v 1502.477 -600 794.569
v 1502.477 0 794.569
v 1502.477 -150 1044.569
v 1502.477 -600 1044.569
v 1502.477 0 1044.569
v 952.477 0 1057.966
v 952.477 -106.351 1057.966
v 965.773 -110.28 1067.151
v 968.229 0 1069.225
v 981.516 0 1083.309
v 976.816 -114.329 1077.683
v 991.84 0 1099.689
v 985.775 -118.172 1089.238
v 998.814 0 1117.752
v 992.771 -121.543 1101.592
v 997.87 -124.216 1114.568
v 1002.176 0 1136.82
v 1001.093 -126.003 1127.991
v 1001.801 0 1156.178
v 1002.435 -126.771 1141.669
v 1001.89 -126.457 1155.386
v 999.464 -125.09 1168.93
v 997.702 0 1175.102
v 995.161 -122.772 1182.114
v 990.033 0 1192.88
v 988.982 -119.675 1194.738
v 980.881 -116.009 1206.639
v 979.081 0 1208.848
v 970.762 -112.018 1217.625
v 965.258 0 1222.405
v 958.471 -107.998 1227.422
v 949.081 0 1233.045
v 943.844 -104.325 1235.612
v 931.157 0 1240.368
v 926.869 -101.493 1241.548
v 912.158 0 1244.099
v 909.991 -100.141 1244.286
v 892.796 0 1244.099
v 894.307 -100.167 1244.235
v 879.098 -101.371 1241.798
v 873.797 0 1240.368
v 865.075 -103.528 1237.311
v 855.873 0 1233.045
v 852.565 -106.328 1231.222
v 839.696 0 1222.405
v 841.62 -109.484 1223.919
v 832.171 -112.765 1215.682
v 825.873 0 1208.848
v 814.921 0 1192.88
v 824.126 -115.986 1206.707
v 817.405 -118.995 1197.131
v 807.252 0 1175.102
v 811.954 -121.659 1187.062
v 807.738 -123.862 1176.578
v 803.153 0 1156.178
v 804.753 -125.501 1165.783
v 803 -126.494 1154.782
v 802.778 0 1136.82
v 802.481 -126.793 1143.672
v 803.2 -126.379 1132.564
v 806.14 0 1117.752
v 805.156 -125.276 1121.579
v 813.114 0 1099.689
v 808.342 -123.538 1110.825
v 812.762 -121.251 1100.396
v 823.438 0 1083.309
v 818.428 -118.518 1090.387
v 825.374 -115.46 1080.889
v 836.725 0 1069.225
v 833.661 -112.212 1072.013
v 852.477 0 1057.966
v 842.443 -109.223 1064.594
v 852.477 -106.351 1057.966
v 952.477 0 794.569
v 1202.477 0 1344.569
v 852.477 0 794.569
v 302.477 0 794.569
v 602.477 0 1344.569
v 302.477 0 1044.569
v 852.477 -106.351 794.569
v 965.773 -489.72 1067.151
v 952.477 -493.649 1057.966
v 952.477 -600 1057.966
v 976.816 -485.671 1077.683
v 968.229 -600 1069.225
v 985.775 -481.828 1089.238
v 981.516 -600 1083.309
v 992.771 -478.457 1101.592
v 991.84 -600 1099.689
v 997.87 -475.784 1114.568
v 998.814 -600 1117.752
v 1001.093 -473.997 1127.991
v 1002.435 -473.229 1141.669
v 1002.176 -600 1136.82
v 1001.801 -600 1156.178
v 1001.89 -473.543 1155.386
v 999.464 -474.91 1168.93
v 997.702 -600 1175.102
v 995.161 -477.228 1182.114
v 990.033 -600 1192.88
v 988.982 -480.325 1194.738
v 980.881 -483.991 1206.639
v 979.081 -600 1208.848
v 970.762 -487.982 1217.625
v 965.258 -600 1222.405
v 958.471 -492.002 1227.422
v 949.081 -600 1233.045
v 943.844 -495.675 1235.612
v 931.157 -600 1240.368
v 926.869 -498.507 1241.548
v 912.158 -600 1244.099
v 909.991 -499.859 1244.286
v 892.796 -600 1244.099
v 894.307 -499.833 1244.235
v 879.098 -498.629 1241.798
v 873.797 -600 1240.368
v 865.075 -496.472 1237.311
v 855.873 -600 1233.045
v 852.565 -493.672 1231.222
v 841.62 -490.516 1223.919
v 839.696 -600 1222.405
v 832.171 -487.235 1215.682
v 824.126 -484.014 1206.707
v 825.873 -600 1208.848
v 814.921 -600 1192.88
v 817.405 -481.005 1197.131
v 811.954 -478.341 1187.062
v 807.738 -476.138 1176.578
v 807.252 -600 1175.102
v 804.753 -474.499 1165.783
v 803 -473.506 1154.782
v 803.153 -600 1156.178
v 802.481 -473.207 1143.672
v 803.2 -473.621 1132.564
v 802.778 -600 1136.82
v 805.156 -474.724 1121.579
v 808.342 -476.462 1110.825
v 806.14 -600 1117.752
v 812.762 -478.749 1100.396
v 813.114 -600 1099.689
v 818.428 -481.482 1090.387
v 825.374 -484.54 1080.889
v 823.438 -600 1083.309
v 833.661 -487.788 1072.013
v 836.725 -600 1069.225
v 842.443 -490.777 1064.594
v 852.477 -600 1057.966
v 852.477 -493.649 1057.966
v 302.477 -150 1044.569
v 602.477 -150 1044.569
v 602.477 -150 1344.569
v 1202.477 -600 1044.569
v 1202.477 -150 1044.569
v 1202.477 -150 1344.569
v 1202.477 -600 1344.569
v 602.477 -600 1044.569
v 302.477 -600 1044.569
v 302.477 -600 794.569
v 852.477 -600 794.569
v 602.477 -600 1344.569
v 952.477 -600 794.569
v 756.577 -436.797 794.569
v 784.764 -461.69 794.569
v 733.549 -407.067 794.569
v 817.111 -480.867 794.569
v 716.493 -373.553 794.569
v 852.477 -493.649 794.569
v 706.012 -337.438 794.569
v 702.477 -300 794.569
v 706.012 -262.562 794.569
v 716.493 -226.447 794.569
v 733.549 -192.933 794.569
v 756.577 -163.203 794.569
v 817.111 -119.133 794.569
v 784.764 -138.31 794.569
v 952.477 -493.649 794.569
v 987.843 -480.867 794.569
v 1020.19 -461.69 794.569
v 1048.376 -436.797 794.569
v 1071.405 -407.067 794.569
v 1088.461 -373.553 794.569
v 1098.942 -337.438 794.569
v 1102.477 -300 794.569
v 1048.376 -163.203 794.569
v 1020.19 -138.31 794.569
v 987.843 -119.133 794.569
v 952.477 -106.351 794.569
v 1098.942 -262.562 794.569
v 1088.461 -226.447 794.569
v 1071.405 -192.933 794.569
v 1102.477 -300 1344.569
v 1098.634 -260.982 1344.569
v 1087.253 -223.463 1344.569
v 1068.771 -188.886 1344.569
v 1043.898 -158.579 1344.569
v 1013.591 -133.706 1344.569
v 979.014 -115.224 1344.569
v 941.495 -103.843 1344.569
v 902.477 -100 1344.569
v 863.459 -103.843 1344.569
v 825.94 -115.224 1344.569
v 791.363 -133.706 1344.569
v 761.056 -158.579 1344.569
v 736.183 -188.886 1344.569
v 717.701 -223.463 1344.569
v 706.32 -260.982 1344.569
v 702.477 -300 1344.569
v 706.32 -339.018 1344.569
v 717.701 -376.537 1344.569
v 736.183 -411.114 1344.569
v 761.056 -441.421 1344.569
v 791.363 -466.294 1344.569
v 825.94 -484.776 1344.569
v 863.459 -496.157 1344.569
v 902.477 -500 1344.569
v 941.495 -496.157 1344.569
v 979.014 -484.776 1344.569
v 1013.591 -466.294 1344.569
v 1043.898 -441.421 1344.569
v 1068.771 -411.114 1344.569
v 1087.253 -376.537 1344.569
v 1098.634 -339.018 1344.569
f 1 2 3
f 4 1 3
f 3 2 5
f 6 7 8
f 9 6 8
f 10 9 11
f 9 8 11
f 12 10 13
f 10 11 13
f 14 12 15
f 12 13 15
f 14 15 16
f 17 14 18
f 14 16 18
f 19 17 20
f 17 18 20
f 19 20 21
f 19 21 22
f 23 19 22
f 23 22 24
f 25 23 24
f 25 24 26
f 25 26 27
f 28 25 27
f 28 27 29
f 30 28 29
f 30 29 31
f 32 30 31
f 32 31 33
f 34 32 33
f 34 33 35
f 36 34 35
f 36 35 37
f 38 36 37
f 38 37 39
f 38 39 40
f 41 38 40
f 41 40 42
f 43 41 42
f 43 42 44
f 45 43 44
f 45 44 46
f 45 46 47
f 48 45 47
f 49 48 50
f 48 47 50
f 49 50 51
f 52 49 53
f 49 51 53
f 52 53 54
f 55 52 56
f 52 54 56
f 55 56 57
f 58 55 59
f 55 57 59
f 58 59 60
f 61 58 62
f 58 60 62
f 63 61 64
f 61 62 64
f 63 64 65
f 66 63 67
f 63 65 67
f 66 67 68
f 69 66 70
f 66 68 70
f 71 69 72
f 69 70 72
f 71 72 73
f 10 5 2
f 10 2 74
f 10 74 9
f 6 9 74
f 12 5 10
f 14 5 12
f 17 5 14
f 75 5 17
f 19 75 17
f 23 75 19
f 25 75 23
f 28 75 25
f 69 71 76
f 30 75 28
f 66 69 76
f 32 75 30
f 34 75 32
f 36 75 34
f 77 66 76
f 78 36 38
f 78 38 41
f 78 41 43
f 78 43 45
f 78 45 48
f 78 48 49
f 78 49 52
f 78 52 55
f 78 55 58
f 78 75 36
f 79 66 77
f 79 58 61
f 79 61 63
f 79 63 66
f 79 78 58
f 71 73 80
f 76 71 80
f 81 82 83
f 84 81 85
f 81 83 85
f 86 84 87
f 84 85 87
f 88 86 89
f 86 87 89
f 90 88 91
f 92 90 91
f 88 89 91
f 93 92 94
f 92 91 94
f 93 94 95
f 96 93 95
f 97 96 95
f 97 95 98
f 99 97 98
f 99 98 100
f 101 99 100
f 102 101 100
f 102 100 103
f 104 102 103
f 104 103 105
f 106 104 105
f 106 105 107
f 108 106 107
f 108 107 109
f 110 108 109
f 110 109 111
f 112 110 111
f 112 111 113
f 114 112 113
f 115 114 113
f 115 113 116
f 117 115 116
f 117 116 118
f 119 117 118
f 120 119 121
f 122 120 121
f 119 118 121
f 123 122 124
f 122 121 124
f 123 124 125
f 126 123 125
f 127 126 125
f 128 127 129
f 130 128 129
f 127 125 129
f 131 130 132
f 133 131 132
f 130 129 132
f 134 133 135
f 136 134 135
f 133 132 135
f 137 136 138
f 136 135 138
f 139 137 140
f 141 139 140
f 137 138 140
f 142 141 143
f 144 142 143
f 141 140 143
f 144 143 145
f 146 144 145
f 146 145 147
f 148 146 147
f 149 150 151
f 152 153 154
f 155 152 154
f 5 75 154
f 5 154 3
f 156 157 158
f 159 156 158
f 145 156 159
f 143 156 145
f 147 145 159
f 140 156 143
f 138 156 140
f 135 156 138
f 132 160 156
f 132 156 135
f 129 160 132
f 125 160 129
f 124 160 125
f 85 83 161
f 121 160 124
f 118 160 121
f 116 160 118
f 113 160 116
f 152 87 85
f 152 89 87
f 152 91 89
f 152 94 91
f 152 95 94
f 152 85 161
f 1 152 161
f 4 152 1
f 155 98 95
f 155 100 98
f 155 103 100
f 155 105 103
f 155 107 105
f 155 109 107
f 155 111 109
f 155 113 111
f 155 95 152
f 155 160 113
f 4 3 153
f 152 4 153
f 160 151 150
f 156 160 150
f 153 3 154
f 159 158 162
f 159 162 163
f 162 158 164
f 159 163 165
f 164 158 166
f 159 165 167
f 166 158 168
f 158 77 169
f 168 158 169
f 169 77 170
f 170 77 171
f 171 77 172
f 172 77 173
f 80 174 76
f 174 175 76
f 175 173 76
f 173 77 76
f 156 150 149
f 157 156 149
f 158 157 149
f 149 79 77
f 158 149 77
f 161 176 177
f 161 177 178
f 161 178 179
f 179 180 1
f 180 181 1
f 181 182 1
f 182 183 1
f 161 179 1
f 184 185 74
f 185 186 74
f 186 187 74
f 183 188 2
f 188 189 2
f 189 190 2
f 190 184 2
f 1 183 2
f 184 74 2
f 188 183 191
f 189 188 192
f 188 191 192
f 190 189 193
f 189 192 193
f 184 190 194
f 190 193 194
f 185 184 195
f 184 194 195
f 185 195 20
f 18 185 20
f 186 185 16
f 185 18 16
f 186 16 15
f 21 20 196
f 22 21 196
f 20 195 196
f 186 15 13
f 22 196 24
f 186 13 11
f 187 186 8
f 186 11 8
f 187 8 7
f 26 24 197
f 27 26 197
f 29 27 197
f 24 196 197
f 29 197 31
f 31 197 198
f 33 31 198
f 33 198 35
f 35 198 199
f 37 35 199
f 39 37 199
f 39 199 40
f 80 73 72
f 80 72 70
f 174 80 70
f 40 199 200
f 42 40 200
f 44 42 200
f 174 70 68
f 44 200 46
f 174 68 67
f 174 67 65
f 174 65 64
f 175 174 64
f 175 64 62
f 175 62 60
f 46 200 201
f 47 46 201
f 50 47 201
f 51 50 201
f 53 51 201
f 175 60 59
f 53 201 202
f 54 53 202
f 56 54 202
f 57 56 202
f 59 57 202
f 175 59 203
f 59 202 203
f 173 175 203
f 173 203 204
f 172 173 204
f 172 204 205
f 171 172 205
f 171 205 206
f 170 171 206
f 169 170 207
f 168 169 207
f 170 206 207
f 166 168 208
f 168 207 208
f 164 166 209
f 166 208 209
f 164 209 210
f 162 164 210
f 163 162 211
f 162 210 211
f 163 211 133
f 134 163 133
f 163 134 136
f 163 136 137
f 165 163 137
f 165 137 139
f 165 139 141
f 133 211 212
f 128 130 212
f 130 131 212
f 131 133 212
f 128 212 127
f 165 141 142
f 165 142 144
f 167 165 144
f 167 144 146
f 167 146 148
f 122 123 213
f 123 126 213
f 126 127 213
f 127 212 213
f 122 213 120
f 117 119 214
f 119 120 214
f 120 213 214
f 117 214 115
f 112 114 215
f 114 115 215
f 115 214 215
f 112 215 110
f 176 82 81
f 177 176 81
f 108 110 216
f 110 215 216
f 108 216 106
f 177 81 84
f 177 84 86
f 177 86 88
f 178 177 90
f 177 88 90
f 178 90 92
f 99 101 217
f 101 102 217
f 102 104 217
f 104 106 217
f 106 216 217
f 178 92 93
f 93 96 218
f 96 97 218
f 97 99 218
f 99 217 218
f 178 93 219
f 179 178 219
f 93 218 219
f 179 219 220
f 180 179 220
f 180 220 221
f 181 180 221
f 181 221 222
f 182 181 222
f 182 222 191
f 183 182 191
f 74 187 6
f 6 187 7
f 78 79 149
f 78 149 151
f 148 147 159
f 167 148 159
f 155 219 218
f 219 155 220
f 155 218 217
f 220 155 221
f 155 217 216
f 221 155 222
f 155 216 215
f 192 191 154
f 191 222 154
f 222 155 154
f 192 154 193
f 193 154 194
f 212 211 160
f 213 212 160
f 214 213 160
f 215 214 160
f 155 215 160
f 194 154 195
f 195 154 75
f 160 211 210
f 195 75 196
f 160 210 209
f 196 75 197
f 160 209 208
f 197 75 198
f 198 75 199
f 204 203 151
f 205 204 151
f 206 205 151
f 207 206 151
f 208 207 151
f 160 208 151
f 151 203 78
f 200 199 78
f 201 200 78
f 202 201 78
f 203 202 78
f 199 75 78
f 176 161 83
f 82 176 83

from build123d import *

# Parameters (mm, degrees)
F1_DEPTH = 600
F3_DEPTH = 150
F5_DEPTH = 600.001
F6_R     = 200
F7_DEPTH = 550.001


with BuildPart() as f1:
    # F0 (on Front) → F1 (new body)
    with BuildSketch(Plane.XZ):
        Polygon((302.476975, 1044.568934), (302.476975, 794.568934), (1502.476975, 794.568934), (1502.476975, 1044.568934), (1202.476975, 1044.568934), (1202.476975, 1344.568934), (602.476975, 1344.568934), (602.476975, 1044.568934), align=None)
    extrude(amount=F1_DEPTH)

    # F2 (on face) → F3 (join)
    with BuildSketch(Plane(origin=(0, 0, 0), x_dir=(-1, 0, 0), z_dir=(0, 1, 0))):
        Polygon((-1202.476975, 1344.568934), (-1502.476975, 1044.568934), (-1202.476975, 1044.568934), align=None)
        Polygon((-302.476975, 1044.568934), (-602.476975, 1344.568934), (-602.476975, 1044.568934), align=None)
    extrude(amount=-F3_DEPTH)

    # F4 (on face) → F5 (cut, through all)
    with BuildSketch(Plane.XZ.offset(600)):
        with BuildLine():
            Line((952.476975, 445.364194), (952.476975, 1057.966394))
            ThreePointArc((952.476975, 1057.966394), (902.476975, 1244.568934), (852.476975, 1057.966394))
            Line((852.476975, 1057.966394), (852.476975, 445.364194))
            Line((852.476975, 445.364194), (952.476975, 445.364194))
        make_face()
    extrude(amount=-F5_DEPTH, mode=Mode.SUBTRACT)

    # F6 (on face) → F7 (cut, through all)
    with BuildSketch(Plane.XY.offset(1344.568934)):
        with Locations((902.476975, -300)):
            Circle(F6_R)
    extrude(amount=-F7_DEPTH, mode=Mode.SUBTRACT)


solid = f1.part
